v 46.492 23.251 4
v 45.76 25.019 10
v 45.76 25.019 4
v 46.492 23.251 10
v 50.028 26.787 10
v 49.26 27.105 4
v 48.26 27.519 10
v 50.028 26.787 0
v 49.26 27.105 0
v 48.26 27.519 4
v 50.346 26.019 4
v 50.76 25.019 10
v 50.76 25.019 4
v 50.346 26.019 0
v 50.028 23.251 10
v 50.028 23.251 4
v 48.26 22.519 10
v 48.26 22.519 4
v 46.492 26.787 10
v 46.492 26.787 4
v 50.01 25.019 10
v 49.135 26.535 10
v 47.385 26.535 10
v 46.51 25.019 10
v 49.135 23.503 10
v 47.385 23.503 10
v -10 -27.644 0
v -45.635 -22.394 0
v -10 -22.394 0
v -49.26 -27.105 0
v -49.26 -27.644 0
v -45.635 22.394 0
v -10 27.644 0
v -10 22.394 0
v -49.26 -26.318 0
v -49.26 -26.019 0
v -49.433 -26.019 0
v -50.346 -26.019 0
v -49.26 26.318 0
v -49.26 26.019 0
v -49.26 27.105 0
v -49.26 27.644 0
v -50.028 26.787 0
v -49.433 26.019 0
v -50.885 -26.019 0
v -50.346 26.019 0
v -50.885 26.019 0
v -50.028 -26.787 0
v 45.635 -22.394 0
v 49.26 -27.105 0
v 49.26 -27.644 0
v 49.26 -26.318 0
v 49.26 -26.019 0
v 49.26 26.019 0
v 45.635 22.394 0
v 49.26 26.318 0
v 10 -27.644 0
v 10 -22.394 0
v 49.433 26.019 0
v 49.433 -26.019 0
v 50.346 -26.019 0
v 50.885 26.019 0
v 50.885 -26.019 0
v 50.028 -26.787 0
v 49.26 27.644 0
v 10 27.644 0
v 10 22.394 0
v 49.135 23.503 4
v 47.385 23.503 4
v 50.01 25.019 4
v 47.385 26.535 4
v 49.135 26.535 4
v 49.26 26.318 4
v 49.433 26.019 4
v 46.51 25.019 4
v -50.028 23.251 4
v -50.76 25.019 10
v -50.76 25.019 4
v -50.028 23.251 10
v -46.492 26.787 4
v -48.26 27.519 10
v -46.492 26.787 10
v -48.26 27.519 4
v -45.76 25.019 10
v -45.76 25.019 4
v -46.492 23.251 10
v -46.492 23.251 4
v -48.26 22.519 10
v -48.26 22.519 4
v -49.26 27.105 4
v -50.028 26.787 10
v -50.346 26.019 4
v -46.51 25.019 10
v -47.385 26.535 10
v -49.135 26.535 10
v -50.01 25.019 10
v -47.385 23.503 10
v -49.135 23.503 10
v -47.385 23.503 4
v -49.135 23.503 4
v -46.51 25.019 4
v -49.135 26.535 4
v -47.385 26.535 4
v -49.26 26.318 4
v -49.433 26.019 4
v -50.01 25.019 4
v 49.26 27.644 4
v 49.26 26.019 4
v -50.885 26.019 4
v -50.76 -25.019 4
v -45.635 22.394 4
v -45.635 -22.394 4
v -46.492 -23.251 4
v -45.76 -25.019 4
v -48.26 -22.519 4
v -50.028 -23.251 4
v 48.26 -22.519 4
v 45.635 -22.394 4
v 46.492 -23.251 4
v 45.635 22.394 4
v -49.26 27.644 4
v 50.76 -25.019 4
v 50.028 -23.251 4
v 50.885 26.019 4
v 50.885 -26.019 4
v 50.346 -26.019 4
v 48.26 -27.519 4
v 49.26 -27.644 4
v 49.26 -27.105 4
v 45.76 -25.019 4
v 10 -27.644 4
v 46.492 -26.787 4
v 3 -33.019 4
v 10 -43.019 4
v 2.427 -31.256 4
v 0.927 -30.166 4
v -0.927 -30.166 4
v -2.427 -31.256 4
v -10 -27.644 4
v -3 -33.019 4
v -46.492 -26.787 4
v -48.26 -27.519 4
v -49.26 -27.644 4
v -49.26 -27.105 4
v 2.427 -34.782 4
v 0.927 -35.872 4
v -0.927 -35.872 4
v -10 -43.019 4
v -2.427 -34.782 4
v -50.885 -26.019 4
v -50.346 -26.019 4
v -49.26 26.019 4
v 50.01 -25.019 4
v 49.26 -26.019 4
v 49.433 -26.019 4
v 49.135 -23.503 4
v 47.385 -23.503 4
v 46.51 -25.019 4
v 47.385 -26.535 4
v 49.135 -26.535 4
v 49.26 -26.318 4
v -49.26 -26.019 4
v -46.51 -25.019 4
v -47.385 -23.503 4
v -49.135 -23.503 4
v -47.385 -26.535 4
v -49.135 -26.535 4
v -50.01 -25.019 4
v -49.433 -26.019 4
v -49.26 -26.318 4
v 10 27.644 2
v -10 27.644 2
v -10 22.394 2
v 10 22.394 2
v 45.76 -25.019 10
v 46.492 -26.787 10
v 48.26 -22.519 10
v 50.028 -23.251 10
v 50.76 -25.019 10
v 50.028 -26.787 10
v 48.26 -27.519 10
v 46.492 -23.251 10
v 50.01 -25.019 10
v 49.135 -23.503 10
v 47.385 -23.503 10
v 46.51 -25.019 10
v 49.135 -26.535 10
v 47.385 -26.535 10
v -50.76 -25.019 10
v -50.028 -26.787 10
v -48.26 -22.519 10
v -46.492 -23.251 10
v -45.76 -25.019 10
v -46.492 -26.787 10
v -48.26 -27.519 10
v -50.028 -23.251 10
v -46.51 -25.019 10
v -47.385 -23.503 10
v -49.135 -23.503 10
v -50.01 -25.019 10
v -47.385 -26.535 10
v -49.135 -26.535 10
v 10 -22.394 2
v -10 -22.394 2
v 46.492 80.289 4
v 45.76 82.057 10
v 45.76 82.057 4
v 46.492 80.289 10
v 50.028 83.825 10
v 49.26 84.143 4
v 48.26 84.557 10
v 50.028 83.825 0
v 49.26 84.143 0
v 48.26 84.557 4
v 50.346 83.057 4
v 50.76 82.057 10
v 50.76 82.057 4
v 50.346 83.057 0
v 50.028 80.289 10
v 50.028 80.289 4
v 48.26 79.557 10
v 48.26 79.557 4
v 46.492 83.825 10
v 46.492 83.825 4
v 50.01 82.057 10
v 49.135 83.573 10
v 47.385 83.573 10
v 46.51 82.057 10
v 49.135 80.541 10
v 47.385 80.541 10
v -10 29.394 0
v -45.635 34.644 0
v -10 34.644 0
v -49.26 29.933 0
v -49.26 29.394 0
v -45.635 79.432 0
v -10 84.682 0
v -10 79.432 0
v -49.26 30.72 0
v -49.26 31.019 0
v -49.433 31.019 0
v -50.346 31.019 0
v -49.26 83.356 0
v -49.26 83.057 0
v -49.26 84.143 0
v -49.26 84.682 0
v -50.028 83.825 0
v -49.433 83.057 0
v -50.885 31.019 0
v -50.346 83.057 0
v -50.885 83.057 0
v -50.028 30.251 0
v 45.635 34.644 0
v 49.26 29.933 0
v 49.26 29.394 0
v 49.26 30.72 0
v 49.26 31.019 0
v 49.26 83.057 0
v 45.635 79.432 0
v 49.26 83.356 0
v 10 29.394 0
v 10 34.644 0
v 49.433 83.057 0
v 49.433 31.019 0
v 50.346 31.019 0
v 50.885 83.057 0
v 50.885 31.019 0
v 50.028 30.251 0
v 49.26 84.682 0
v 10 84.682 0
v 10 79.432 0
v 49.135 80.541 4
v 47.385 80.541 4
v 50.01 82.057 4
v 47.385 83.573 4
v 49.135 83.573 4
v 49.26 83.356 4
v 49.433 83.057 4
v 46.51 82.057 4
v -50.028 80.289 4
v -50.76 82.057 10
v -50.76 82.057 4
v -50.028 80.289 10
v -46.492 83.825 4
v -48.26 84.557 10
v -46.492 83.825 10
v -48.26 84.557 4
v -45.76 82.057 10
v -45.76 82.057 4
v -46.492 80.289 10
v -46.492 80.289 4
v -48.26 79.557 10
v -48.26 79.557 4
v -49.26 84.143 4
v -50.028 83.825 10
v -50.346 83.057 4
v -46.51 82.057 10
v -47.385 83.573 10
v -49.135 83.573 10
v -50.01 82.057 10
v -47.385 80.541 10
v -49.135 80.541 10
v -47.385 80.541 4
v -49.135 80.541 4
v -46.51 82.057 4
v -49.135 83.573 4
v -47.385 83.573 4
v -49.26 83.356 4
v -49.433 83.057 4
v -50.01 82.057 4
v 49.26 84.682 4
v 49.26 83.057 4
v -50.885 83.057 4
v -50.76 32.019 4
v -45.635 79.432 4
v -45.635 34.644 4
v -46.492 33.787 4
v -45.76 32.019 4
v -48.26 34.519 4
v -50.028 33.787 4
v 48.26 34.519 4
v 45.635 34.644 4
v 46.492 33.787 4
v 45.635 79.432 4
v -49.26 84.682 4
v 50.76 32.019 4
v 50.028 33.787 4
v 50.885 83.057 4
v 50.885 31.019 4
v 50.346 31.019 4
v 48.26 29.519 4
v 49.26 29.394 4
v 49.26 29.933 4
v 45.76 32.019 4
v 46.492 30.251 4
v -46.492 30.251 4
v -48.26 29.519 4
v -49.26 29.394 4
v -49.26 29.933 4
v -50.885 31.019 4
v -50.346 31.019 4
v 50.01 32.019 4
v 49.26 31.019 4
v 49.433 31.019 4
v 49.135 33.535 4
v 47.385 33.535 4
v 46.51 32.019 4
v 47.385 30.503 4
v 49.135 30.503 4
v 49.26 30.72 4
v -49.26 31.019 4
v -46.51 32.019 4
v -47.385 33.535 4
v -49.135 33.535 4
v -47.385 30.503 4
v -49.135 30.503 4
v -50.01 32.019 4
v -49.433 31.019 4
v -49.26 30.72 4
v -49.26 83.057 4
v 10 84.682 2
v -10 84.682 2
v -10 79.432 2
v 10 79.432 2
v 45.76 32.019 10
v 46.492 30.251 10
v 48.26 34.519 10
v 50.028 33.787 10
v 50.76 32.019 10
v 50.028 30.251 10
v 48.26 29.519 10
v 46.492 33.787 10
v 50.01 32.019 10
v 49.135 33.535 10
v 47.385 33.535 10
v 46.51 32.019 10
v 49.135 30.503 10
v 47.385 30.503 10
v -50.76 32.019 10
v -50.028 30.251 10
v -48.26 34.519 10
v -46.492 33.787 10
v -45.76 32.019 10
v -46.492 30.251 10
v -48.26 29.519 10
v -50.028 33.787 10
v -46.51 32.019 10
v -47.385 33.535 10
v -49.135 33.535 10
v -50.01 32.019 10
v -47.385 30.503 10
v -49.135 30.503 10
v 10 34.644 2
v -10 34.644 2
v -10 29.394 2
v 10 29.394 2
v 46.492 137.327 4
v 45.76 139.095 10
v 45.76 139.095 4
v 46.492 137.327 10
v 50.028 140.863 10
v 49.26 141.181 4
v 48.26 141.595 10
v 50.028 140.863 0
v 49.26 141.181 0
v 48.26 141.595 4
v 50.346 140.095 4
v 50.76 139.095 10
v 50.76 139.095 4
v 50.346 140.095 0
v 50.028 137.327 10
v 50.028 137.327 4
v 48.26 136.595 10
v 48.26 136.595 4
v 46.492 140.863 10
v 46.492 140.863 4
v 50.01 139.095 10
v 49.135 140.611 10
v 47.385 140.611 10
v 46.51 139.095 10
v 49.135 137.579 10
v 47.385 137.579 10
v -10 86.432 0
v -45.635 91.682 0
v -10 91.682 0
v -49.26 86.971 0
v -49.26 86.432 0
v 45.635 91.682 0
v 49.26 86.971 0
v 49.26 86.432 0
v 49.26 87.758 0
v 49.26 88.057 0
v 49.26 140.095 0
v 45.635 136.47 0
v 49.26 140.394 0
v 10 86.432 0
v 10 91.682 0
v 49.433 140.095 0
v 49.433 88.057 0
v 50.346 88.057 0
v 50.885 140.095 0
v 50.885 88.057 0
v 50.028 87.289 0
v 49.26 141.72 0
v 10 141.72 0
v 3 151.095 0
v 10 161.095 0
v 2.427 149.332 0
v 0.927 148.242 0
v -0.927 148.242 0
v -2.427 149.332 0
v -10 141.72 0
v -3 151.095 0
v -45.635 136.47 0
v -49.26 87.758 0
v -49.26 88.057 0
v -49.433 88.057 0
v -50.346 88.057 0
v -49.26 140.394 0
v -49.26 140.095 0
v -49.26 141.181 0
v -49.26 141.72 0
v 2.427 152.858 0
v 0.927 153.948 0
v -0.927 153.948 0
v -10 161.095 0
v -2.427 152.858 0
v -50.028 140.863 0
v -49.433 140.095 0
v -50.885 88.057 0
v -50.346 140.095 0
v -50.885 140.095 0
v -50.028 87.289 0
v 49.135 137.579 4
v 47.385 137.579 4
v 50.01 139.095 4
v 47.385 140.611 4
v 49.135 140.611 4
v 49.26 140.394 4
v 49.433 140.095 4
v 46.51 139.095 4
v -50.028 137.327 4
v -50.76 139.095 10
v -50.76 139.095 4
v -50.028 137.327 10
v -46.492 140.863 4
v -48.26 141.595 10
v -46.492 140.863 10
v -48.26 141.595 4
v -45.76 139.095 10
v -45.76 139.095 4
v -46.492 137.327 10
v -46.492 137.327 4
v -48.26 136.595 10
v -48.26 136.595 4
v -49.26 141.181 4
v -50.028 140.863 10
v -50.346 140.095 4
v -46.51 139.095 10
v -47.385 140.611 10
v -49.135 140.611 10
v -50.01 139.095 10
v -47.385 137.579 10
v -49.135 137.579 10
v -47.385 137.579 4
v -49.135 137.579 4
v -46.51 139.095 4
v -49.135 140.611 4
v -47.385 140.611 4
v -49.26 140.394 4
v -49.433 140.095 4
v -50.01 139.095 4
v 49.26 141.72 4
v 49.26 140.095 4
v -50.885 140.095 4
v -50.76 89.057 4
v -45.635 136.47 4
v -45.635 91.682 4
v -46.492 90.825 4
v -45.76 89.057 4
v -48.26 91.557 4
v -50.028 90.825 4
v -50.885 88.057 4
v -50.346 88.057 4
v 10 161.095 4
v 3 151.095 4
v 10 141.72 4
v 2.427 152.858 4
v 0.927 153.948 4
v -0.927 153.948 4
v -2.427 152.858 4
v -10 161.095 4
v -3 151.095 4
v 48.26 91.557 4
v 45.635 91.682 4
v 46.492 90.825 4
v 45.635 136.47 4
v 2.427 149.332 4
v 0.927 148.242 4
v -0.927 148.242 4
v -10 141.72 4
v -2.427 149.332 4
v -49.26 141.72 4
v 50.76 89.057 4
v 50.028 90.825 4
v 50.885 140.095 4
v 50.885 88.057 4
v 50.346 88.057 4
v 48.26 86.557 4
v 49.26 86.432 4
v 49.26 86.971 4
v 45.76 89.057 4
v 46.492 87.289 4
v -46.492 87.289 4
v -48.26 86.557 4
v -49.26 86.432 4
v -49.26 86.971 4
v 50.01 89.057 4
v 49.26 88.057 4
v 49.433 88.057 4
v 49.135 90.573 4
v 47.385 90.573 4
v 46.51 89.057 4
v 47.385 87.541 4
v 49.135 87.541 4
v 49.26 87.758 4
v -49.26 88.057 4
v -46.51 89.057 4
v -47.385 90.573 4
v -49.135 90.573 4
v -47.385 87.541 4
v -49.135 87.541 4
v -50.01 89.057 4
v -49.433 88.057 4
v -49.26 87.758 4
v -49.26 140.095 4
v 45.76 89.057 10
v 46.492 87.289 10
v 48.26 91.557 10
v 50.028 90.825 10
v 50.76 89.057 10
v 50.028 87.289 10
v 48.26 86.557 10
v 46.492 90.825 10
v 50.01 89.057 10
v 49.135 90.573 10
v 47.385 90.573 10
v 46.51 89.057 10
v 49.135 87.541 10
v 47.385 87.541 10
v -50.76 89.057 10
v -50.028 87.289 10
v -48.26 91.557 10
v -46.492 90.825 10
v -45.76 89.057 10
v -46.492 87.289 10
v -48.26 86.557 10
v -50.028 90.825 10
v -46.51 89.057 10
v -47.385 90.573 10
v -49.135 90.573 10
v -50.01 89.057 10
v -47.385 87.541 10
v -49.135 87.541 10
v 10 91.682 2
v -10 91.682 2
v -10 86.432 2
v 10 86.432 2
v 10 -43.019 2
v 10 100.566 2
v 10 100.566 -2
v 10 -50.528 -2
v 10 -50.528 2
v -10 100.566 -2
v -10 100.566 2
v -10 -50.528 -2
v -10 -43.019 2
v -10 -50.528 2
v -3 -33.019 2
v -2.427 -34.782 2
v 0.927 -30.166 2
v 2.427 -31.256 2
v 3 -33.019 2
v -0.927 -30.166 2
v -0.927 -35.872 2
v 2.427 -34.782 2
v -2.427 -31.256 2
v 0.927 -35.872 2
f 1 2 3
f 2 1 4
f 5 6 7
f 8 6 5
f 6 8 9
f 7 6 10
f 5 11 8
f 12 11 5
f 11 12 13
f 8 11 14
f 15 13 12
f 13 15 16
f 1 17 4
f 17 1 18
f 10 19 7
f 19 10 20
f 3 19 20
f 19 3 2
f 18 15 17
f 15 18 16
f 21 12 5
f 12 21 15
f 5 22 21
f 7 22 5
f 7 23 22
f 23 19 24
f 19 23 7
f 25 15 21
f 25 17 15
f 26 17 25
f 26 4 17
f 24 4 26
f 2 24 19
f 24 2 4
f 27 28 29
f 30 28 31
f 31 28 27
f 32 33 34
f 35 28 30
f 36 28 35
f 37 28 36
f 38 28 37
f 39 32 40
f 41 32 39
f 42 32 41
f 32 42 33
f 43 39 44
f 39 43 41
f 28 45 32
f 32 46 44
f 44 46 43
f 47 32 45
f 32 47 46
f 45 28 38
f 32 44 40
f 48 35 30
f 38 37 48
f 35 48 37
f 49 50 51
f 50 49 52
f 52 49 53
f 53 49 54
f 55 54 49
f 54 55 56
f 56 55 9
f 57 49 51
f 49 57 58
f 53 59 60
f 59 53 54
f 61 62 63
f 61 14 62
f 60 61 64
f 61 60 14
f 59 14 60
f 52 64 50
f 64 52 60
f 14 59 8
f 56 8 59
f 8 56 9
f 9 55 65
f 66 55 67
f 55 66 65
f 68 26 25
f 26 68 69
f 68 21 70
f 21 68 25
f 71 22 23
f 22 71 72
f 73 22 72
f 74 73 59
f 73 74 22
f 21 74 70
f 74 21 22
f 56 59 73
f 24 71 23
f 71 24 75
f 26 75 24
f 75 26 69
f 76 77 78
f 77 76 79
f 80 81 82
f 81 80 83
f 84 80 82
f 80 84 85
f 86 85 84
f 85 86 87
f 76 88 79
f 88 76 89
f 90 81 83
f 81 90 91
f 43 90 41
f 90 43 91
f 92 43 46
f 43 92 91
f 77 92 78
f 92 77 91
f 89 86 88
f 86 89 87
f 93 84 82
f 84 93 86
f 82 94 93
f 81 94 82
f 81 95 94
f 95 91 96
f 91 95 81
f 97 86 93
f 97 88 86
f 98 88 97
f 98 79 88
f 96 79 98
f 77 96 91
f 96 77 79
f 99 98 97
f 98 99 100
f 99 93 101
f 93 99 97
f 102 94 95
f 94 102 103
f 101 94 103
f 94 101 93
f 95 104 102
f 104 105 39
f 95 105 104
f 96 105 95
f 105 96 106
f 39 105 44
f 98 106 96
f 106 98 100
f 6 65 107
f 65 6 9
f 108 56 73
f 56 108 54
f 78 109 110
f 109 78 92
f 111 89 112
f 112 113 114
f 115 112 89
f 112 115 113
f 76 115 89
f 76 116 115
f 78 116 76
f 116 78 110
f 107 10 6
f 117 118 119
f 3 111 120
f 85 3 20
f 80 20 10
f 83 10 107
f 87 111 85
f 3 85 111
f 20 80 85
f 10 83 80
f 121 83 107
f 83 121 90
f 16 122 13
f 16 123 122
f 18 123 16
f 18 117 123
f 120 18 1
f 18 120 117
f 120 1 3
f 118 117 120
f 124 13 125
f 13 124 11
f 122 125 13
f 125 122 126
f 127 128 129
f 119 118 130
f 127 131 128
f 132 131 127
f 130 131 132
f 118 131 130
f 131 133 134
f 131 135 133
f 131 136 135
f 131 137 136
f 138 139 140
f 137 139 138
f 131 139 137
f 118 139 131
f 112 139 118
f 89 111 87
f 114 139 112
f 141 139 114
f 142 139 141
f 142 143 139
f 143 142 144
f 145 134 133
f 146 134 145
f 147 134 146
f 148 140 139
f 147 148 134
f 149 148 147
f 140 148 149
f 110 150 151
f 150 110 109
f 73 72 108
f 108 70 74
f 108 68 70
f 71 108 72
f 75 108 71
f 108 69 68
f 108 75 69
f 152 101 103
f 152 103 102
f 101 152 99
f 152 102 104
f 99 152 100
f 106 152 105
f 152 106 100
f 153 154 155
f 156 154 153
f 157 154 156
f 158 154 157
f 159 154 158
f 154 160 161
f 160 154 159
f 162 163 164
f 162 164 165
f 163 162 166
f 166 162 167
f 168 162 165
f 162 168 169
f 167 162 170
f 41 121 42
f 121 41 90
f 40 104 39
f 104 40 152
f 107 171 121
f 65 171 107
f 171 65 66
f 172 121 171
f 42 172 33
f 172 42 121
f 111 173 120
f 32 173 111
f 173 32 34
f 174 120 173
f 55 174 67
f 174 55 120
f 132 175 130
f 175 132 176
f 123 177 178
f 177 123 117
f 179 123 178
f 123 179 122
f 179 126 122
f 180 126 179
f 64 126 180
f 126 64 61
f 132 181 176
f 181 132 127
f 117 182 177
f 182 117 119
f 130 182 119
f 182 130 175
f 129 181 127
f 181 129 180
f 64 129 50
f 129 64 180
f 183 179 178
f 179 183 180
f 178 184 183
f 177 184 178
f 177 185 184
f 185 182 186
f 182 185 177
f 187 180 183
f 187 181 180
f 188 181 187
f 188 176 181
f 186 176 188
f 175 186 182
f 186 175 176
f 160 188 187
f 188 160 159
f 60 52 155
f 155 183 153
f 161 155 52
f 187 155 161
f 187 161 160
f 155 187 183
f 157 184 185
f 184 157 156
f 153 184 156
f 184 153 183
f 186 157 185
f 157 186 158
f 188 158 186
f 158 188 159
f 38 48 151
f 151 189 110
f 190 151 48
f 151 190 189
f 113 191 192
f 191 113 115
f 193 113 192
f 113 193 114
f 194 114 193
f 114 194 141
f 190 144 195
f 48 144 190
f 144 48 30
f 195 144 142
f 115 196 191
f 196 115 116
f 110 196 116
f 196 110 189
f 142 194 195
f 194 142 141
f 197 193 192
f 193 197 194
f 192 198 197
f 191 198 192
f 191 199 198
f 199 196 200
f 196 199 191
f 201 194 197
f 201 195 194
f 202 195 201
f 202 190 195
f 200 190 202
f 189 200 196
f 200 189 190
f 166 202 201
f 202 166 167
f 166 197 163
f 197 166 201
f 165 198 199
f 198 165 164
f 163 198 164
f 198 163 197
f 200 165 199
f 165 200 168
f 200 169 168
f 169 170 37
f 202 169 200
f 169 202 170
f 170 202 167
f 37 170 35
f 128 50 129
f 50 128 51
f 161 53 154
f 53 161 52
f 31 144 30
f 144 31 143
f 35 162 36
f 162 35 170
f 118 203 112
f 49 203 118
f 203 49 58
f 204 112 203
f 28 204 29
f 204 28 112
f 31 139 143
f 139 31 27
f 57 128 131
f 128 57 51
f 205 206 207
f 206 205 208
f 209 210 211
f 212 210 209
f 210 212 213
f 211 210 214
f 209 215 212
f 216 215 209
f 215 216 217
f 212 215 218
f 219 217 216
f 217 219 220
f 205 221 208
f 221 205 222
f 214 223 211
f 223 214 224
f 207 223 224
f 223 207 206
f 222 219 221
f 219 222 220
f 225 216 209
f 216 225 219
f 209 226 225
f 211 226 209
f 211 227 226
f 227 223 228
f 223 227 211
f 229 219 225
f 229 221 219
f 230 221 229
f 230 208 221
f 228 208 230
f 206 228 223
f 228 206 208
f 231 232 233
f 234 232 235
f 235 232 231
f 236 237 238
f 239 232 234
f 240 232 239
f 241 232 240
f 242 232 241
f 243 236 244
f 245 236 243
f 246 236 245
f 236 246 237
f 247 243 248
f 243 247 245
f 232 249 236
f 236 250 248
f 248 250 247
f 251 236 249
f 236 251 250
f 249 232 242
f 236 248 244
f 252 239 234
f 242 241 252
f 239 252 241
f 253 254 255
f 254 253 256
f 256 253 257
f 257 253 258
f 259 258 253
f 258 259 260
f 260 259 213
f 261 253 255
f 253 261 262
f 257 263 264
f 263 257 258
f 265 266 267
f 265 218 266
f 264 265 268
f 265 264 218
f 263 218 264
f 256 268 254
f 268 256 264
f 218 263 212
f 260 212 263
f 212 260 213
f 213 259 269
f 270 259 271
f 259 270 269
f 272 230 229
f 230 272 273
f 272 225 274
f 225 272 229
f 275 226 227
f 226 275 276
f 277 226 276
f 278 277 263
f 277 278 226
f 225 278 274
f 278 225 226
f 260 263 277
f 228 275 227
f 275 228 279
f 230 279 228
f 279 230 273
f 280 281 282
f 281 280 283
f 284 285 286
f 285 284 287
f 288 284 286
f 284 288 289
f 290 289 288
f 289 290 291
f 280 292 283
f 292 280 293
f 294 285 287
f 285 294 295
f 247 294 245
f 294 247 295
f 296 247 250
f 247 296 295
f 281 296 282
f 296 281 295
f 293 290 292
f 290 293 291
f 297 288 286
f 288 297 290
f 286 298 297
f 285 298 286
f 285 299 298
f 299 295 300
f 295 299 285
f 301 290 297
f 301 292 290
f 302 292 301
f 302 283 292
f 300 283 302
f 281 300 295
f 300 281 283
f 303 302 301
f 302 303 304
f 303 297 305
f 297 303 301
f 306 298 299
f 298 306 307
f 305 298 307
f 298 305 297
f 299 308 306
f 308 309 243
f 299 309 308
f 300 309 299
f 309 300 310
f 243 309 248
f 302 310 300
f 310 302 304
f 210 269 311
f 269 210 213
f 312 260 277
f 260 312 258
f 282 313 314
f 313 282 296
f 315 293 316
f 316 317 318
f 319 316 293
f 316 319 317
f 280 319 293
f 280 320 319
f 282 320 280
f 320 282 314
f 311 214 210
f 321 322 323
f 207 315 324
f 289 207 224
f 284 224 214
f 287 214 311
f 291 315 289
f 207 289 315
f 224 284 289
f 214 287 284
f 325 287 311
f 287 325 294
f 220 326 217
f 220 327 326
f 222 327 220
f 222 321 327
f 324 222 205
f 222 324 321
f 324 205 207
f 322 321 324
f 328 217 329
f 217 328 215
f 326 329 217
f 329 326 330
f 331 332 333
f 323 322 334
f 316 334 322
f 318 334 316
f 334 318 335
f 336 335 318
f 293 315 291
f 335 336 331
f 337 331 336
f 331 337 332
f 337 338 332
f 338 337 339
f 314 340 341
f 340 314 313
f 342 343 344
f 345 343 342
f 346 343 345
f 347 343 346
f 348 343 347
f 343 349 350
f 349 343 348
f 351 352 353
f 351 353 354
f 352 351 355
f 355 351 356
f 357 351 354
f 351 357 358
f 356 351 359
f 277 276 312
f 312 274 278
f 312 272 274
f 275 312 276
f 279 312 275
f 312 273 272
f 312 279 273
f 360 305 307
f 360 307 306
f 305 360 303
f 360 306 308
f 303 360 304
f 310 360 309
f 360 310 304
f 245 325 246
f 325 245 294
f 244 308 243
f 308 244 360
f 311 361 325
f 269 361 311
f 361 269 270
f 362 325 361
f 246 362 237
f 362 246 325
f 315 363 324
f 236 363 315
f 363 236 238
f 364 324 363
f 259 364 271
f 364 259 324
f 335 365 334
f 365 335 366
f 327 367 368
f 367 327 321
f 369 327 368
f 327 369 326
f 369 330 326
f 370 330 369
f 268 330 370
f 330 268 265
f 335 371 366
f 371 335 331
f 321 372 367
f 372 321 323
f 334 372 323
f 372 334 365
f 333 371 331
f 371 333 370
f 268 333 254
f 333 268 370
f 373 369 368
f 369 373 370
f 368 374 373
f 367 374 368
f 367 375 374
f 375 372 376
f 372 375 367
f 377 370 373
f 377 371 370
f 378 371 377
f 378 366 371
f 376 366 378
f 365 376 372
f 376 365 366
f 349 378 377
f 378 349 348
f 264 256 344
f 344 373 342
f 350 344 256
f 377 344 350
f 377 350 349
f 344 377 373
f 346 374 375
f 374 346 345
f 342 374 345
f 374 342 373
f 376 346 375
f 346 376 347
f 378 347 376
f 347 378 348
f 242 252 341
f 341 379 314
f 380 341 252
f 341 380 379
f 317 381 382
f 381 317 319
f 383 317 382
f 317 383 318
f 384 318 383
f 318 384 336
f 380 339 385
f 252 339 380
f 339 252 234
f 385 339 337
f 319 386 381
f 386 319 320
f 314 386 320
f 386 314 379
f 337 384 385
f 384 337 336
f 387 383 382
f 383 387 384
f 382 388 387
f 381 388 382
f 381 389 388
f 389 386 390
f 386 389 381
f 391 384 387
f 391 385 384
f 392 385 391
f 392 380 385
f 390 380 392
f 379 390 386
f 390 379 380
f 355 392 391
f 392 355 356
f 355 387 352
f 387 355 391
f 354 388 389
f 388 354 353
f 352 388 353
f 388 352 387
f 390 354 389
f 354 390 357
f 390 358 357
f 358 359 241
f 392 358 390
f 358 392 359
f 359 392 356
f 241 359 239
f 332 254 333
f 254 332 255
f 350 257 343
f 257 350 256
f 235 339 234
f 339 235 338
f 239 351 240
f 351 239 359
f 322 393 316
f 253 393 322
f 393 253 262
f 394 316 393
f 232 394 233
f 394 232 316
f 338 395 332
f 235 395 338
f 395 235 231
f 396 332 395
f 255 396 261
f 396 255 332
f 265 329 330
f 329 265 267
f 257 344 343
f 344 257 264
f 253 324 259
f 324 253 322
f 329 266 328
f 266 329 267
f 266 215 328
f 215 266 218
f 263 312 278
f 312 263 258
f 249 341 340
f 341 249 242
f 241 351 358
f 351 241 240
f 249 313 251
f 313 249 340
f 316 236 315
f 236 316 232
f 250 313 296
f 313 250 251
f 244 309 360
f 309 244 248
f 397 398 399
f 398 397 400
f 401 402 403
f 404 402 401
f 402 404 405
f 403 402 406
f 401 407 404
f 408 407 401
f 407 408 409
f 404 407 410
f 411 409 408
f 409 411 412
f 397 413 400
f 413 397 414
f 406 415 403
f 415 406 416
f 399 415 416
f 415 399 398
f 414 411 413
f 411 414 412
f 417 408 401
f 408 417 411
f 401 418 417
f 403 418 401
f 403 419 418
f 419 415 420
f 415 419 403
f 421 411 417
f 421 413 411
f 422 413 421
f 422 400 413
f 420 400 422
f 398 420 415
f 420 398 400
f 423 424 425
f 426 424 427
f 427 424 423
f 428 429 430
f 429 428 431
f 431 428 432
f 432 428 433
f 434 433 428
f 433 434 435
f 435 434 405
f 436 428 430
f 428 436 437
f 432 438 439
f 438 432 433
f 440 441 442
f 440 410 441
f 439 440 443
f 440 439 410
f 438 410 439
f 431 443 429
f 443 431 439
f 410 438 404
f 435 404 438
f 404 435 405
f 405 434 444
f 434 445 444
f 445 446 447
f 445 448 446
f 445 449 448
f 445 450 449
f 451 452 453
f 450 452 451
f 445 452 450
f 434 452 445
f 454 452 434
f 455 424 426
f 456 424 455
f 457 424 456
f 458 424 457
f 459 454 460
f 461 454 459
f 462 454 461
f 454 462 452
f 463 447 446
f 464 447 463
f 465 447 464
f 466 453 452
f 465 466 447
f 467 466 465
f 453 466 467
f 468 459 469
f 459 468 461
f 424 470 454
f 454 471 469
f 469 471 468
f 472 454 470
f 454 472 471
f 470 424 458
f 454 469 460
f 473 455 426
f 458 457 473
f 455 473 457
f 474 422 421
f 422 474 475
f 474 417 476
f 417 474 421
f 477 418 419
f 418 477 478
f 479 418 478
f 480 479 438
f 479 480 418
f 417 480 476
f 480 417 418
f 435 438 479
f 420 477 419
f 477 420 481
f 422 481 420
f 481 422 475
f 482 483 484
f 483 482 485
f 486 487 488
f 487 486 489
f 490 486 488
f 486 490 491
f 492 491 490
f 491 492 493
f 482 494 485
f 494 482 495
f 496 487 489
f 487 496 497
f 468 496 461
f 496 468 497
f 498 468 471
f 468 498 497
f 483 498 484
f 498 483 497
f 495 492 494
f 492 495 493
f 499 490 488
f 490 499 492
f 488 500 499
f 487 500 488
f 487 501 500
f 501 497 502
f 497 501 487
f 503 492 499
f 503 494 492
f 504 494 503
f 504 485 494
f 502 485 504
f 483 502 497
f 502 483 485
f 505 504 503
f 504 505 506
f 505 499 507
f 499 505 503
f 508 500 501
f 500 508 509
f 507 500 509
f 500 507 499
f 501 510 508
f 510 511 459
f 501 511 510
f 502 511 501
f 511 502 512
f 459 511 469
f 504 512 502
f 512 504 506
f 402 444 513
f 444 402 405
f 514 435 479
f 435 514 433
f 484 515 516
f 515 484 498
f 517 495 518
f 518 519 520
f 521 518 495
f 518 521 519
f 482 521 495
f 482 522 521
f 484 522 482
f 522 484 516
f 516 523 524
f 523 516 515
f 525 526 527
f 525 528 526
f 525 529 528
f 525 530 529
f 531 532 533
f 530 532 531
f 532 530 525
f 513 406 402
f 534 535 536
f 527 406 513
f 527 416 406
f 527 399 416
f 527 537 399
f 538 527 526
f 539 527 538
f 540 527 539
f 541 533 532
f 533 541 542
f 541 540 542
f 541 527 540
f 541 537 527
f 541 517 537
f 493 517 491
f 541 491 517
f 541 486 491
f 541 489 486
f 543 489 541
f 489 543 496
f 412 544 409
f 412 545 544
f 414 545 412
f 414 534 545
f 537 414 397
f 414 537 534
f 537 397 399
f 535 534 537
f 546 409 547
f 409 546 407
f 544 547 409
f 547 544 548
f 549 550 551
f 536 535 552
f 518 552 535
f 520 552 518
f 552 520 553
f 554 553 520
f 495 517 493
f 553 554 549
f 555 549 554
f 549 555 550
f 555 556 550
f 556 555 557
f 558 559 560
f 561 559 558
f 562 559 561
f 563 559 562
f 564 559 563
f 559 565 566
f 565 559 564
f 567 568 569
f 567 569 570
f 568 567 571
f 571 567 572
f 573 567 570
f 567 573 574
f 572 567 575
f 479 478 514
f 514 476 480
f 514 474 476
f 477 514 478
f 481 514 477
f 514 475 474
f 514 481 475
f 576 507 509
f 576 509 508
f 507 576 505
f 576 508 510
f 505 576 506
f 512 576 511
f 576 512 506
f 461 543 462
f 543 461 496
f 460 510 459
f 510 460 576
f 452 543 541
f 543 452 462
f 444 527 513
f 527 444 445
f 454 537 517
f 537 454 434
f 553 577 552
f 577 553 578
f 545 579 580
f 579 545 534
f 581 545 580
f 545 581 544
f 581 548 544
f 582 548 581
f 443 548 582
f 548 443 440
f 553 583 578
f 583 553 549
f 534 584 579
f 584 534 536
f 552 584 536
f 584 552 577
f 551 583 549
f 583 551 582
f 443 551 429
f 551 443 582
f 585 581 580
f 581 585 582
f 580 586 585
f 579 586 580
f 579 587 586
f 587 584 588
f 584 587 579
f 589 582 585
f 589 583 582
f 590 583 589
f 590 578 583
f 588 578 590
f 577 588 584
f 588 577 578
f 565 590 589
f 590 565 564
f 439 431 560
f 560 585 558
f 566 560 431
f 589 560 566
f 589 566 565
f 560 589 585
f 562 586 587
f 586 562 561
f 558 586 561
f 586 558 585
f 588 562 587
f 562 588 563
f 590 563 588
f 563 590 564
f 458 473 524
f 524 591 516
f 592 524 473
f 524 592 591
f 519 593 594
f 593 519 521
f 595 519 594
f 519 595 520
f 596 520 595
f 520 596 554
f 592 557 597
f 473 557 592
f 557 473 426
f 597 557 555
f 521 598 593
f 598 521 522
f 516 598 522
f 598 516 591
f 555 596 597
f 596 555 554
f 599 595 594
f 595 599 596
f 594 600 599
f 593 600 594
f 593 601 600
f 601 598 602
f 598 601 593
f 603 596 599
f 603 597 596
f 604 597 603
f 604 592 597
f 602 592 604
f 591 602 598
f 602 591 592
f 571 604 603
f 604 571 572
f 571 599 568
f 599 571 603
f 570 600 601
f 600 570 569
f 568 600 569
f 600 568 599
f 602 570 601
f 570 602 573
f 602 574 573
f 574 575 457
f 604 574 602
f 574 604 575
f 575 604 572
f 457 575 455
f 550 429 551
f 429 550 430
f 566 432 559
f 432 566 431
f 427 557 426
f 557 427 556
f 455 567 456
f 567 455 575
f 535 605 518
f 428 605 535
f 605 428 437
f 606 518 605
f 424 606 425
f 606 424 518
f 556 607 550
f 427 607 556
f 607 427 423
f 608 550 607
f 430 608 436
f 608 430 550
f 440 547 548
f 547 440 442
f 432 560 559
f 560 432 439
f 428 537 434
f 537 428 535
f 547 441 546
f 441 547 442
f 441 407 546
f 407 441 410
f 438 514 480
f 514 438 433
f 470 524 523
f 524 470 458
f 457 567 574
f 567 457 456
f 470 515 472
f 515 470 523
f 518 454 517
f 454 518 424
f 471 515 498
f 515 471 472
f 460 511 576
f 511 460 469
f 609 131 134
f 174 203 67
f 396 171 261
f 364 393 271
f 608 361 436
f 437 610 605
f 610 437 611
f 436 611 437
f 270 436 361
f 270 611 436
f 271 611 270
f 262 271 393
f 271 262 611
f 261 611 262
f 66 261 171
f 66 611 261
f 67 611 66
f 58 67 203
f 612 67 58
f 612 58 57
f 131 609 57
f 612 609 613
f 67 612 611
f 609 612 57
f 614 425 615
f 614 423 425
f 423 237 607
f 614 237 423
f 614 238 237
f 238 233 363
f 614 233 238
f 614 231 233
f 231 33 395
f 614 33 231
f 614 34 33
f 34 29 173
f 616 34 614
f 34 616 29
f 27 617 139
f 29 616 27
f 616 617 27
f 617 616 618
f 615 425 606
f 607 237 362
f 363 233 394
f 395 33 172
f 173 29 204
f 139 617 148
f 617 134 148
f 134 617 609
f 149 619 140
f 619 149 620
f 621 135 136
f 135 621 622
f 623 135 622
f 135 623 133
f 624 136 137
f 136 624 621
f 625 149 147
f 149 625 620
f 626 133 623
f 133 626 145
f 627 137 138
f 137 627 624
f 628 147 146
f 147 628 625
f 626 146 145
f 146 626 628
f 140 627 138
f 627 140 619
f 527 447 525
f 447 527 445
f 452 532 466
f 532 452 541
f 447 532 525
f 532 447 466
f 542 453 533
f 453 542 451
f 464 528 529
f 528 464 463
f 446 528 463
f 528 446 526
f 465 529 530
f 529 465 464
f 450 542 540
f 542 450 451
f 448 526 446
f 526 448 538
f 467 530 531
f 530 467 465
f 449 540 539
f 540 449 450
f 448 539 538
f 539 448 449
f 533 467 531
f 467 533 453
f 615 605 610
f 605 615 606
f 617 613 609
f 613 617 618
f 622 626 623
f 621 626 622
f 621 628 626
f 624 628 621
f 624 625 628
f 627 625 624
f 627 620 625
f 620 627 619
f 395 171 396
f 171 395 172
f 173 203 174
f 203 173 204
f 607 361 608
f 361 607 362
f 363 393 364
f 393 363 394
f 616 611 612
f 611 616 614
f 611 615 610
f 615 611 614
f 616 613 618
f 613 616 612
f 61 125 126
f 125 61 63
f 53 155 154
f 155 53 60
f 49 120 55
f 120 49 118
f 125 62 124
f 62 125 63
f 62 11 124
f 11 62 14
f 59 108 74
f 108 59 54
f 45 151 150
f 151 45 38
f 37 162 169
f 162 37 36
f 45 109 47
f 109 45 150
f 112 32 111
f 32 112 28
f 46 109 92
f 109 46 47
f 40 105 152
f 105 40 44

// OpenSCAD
union() {
	translate(v = [0, 25.0190000000, 0]) {
		cube(center = true, size = [20, 151.0950000000, 4]);
	}
	translate(v = [0, 25.0190000000, 0]) {
		union() {
			translate(v = [0, 0, 2.0000000000]) {
				cube(center = true, size = [98.5200000000, 5.2500000000, 4]);
			}
			translate(v = [48.2600000000, 0, 0]) {
				difference() {
					cylinder(d = 5, h = 10);
					cylinder(d = 3.5000000000, h = 10);
				}
			}
			translate(v = [-48.2600000000, 0, 0]) {
				difference() {
					cylinder(d = 5, h = 10);
					cylinder(d = 3.5000000000, h = 10);
				}
			}
		}
	}
	translate(v = [0, -25.0190000000, 0]) {
		union() {
			translate(v = [0, 0, 2.0000000000]) {
				cube(center = true, size = [98.5200000000, 5.2500000000, 4]);
			}
			translate(v = [48.2600000000, 0, 0]) {
				difference() {
					cylinder(d = 5, h = 10);
					cylinder(d = 3.5000000000, h = 10);
				}
			}
			translate(v = [-48.2600000000, 0, 0]) {
				difference() {
					cylinder(d = 5, h = 10);
					cylinder(d = 3.5000000000, h = 10);
				}
			}
		}
	}
	translate(v = [48.2600000000, 0, 0]) {
		rotate(a = [0, 0, 90]) {
			translate(v = [0, 0, 2.0000000000]) {
				cube(center = true, size = [52.0380000000, 5.2500000000, 4]);
			}
		}
	}
	translate(v = [-48.2600000000, 0, 0]) {
		rotate(a = [0, 0, 90]) {
			translate(v = [0, 0, 2.0000000000]) {
				cube(center = true, size = [52.0380000000, 5.2500000000, 4]);
			}
		}
	}
	translate(v = [0, 57.0380000000, 0]) {
		union() {
			translate(v = [0, 25.0190000000, 0]) {
				union() {
					translate(v = [0, 0, 2.0000000000]) {
						cube(center = true, size = [98.5200000000, 5.2500000000, 4]);
					}
					translate(v = [48.2600000000, 0, 0]) {
						difference() {
							cylinder(d = 5, h = 10);
							cylinder(d = 3.5000000000, h = 10);
						}
					}
					translate(v = [-48.2600000000, 0, 0]) {
						difference() {
							cylinder(d = 5, h = 10);
							cylinder(d = 3.5000000000, h = 10);
						}
					}
				}
			}
			translate(v = [0, -25.0190000000, 0]) {
				union() {
					translate(v = [0, 0, 2.0000000000]) {
						cube(center = true, size = [98.5200000000, 5.2500000000, 4]);
					}
					translate(v = [48.2600000000, 0, 0]) {
						difference() {
							cylinder(d = 5, h = 10);
							cylinder(d = 3.5000000000, h = 10);
						}
					}
					translate(v = [-48.2600000000, 0, 0]) {
						difference() {
							cylinder(d = 5, h = 10);
							cylinder(d = 3.5000000000, h = 10);
						}
					}
				}
			}
			translate(v = [48.2600000000, 0, 0]) {
				rotate(a = [0, 0, 90]) {
					translate(v = [0, 0, 2.0000000000]) {
						cube(center = true, size = [52.0380000000, 5.2500000000, 4]);
					}
				}
			}
			translate(v = [-48.2600000000, 0, 0]) {
				rotate(a = [0, 0, 90]) {
					translate(v = [0, 0, 2.0000000000]) {
						cube(center = true, size = [52.0380000000, 5.2500000000, 4]);
					}
				}
			}
		}
	}
	translate(v = [0, 114.0760000000, 0]) {
		union() {
			translate(v = [0, 25.0190000000, 0]) {
				union() {
					translate(v = [0, 0, 2.0000000000]) {
						cube(center = true, size = [98.5200000000, 5.2500000000, 4]);
					}
					translate(v = [48.2600000000, 0, 0]) {
						difference() {
							cylinder(d = 5, h = 10);
							cylinder(d = 3.5000000000, h = 10);
						}
					}
					translate(v = [-48.2600000000, 0, 0]) {
						difference() {
							cylinder(d = 5, h = 10);
							cylinder(d = 3.5000000000, h = 10);
						}
					}
				}
			}
			translate(v = [0, -25.0190000000, 0]) {
				union() {
					translate(v = [0, 0, 2.0000000000]) {
						cube(center = true, size = [98.5200000000, 5.2500000000, 4]);
					}
					translate(v = [48.2600000000, 0, 0]) {
						difference() {
							cylinder(d = 5, h = 10);
							cylinder(d = 3.5000000000, h = 10);
						}
					}
					translate(v = [-48.2600000000, 0, 0]) {
						difference() {
							cylinder(d = 5, h = 10);
							cylinder(d = 3.5000000000, h = 10);
						}
					}
				}
			}
			translate(v = [48.2600000000, 0, 0]) {
				rotate(a = [0, 0, 90]) {
					translate(v = [0, 0, 2.0000000000]) {
						cube(center = true, size = [52.0380000000, 5.2500000000, 4]);
					}
				}
			}
			translate(v = [-48.2600000000, 0, 0]) {
				rotate(a = [0, 0, 90]) {
					translate(v = [0, 0, 2.0000000000]) {
						cube(center = true, size = [52.0380000000, 5.2500000000, 4]);
					}
				}
			}
		}
	}
	translate(v = [0, -33.0190000000, 0]) {
		difference() {
			translate(v = [0, 0, 2.0000000000]) {
				cube(center = true, size = [20, 20, 4]);
			}
			cylinder(d = 6, h = 30);
		}
	}
	translate(v = [0, 151.0950000000, 0]) {
		difference() {
			translate(v = [0, 0, 2.0000000000]) {
				cube(center = true, size = [20, 20, 4]);
			}
			cylinder(d = 6, h = 30);
		}
	}
}
